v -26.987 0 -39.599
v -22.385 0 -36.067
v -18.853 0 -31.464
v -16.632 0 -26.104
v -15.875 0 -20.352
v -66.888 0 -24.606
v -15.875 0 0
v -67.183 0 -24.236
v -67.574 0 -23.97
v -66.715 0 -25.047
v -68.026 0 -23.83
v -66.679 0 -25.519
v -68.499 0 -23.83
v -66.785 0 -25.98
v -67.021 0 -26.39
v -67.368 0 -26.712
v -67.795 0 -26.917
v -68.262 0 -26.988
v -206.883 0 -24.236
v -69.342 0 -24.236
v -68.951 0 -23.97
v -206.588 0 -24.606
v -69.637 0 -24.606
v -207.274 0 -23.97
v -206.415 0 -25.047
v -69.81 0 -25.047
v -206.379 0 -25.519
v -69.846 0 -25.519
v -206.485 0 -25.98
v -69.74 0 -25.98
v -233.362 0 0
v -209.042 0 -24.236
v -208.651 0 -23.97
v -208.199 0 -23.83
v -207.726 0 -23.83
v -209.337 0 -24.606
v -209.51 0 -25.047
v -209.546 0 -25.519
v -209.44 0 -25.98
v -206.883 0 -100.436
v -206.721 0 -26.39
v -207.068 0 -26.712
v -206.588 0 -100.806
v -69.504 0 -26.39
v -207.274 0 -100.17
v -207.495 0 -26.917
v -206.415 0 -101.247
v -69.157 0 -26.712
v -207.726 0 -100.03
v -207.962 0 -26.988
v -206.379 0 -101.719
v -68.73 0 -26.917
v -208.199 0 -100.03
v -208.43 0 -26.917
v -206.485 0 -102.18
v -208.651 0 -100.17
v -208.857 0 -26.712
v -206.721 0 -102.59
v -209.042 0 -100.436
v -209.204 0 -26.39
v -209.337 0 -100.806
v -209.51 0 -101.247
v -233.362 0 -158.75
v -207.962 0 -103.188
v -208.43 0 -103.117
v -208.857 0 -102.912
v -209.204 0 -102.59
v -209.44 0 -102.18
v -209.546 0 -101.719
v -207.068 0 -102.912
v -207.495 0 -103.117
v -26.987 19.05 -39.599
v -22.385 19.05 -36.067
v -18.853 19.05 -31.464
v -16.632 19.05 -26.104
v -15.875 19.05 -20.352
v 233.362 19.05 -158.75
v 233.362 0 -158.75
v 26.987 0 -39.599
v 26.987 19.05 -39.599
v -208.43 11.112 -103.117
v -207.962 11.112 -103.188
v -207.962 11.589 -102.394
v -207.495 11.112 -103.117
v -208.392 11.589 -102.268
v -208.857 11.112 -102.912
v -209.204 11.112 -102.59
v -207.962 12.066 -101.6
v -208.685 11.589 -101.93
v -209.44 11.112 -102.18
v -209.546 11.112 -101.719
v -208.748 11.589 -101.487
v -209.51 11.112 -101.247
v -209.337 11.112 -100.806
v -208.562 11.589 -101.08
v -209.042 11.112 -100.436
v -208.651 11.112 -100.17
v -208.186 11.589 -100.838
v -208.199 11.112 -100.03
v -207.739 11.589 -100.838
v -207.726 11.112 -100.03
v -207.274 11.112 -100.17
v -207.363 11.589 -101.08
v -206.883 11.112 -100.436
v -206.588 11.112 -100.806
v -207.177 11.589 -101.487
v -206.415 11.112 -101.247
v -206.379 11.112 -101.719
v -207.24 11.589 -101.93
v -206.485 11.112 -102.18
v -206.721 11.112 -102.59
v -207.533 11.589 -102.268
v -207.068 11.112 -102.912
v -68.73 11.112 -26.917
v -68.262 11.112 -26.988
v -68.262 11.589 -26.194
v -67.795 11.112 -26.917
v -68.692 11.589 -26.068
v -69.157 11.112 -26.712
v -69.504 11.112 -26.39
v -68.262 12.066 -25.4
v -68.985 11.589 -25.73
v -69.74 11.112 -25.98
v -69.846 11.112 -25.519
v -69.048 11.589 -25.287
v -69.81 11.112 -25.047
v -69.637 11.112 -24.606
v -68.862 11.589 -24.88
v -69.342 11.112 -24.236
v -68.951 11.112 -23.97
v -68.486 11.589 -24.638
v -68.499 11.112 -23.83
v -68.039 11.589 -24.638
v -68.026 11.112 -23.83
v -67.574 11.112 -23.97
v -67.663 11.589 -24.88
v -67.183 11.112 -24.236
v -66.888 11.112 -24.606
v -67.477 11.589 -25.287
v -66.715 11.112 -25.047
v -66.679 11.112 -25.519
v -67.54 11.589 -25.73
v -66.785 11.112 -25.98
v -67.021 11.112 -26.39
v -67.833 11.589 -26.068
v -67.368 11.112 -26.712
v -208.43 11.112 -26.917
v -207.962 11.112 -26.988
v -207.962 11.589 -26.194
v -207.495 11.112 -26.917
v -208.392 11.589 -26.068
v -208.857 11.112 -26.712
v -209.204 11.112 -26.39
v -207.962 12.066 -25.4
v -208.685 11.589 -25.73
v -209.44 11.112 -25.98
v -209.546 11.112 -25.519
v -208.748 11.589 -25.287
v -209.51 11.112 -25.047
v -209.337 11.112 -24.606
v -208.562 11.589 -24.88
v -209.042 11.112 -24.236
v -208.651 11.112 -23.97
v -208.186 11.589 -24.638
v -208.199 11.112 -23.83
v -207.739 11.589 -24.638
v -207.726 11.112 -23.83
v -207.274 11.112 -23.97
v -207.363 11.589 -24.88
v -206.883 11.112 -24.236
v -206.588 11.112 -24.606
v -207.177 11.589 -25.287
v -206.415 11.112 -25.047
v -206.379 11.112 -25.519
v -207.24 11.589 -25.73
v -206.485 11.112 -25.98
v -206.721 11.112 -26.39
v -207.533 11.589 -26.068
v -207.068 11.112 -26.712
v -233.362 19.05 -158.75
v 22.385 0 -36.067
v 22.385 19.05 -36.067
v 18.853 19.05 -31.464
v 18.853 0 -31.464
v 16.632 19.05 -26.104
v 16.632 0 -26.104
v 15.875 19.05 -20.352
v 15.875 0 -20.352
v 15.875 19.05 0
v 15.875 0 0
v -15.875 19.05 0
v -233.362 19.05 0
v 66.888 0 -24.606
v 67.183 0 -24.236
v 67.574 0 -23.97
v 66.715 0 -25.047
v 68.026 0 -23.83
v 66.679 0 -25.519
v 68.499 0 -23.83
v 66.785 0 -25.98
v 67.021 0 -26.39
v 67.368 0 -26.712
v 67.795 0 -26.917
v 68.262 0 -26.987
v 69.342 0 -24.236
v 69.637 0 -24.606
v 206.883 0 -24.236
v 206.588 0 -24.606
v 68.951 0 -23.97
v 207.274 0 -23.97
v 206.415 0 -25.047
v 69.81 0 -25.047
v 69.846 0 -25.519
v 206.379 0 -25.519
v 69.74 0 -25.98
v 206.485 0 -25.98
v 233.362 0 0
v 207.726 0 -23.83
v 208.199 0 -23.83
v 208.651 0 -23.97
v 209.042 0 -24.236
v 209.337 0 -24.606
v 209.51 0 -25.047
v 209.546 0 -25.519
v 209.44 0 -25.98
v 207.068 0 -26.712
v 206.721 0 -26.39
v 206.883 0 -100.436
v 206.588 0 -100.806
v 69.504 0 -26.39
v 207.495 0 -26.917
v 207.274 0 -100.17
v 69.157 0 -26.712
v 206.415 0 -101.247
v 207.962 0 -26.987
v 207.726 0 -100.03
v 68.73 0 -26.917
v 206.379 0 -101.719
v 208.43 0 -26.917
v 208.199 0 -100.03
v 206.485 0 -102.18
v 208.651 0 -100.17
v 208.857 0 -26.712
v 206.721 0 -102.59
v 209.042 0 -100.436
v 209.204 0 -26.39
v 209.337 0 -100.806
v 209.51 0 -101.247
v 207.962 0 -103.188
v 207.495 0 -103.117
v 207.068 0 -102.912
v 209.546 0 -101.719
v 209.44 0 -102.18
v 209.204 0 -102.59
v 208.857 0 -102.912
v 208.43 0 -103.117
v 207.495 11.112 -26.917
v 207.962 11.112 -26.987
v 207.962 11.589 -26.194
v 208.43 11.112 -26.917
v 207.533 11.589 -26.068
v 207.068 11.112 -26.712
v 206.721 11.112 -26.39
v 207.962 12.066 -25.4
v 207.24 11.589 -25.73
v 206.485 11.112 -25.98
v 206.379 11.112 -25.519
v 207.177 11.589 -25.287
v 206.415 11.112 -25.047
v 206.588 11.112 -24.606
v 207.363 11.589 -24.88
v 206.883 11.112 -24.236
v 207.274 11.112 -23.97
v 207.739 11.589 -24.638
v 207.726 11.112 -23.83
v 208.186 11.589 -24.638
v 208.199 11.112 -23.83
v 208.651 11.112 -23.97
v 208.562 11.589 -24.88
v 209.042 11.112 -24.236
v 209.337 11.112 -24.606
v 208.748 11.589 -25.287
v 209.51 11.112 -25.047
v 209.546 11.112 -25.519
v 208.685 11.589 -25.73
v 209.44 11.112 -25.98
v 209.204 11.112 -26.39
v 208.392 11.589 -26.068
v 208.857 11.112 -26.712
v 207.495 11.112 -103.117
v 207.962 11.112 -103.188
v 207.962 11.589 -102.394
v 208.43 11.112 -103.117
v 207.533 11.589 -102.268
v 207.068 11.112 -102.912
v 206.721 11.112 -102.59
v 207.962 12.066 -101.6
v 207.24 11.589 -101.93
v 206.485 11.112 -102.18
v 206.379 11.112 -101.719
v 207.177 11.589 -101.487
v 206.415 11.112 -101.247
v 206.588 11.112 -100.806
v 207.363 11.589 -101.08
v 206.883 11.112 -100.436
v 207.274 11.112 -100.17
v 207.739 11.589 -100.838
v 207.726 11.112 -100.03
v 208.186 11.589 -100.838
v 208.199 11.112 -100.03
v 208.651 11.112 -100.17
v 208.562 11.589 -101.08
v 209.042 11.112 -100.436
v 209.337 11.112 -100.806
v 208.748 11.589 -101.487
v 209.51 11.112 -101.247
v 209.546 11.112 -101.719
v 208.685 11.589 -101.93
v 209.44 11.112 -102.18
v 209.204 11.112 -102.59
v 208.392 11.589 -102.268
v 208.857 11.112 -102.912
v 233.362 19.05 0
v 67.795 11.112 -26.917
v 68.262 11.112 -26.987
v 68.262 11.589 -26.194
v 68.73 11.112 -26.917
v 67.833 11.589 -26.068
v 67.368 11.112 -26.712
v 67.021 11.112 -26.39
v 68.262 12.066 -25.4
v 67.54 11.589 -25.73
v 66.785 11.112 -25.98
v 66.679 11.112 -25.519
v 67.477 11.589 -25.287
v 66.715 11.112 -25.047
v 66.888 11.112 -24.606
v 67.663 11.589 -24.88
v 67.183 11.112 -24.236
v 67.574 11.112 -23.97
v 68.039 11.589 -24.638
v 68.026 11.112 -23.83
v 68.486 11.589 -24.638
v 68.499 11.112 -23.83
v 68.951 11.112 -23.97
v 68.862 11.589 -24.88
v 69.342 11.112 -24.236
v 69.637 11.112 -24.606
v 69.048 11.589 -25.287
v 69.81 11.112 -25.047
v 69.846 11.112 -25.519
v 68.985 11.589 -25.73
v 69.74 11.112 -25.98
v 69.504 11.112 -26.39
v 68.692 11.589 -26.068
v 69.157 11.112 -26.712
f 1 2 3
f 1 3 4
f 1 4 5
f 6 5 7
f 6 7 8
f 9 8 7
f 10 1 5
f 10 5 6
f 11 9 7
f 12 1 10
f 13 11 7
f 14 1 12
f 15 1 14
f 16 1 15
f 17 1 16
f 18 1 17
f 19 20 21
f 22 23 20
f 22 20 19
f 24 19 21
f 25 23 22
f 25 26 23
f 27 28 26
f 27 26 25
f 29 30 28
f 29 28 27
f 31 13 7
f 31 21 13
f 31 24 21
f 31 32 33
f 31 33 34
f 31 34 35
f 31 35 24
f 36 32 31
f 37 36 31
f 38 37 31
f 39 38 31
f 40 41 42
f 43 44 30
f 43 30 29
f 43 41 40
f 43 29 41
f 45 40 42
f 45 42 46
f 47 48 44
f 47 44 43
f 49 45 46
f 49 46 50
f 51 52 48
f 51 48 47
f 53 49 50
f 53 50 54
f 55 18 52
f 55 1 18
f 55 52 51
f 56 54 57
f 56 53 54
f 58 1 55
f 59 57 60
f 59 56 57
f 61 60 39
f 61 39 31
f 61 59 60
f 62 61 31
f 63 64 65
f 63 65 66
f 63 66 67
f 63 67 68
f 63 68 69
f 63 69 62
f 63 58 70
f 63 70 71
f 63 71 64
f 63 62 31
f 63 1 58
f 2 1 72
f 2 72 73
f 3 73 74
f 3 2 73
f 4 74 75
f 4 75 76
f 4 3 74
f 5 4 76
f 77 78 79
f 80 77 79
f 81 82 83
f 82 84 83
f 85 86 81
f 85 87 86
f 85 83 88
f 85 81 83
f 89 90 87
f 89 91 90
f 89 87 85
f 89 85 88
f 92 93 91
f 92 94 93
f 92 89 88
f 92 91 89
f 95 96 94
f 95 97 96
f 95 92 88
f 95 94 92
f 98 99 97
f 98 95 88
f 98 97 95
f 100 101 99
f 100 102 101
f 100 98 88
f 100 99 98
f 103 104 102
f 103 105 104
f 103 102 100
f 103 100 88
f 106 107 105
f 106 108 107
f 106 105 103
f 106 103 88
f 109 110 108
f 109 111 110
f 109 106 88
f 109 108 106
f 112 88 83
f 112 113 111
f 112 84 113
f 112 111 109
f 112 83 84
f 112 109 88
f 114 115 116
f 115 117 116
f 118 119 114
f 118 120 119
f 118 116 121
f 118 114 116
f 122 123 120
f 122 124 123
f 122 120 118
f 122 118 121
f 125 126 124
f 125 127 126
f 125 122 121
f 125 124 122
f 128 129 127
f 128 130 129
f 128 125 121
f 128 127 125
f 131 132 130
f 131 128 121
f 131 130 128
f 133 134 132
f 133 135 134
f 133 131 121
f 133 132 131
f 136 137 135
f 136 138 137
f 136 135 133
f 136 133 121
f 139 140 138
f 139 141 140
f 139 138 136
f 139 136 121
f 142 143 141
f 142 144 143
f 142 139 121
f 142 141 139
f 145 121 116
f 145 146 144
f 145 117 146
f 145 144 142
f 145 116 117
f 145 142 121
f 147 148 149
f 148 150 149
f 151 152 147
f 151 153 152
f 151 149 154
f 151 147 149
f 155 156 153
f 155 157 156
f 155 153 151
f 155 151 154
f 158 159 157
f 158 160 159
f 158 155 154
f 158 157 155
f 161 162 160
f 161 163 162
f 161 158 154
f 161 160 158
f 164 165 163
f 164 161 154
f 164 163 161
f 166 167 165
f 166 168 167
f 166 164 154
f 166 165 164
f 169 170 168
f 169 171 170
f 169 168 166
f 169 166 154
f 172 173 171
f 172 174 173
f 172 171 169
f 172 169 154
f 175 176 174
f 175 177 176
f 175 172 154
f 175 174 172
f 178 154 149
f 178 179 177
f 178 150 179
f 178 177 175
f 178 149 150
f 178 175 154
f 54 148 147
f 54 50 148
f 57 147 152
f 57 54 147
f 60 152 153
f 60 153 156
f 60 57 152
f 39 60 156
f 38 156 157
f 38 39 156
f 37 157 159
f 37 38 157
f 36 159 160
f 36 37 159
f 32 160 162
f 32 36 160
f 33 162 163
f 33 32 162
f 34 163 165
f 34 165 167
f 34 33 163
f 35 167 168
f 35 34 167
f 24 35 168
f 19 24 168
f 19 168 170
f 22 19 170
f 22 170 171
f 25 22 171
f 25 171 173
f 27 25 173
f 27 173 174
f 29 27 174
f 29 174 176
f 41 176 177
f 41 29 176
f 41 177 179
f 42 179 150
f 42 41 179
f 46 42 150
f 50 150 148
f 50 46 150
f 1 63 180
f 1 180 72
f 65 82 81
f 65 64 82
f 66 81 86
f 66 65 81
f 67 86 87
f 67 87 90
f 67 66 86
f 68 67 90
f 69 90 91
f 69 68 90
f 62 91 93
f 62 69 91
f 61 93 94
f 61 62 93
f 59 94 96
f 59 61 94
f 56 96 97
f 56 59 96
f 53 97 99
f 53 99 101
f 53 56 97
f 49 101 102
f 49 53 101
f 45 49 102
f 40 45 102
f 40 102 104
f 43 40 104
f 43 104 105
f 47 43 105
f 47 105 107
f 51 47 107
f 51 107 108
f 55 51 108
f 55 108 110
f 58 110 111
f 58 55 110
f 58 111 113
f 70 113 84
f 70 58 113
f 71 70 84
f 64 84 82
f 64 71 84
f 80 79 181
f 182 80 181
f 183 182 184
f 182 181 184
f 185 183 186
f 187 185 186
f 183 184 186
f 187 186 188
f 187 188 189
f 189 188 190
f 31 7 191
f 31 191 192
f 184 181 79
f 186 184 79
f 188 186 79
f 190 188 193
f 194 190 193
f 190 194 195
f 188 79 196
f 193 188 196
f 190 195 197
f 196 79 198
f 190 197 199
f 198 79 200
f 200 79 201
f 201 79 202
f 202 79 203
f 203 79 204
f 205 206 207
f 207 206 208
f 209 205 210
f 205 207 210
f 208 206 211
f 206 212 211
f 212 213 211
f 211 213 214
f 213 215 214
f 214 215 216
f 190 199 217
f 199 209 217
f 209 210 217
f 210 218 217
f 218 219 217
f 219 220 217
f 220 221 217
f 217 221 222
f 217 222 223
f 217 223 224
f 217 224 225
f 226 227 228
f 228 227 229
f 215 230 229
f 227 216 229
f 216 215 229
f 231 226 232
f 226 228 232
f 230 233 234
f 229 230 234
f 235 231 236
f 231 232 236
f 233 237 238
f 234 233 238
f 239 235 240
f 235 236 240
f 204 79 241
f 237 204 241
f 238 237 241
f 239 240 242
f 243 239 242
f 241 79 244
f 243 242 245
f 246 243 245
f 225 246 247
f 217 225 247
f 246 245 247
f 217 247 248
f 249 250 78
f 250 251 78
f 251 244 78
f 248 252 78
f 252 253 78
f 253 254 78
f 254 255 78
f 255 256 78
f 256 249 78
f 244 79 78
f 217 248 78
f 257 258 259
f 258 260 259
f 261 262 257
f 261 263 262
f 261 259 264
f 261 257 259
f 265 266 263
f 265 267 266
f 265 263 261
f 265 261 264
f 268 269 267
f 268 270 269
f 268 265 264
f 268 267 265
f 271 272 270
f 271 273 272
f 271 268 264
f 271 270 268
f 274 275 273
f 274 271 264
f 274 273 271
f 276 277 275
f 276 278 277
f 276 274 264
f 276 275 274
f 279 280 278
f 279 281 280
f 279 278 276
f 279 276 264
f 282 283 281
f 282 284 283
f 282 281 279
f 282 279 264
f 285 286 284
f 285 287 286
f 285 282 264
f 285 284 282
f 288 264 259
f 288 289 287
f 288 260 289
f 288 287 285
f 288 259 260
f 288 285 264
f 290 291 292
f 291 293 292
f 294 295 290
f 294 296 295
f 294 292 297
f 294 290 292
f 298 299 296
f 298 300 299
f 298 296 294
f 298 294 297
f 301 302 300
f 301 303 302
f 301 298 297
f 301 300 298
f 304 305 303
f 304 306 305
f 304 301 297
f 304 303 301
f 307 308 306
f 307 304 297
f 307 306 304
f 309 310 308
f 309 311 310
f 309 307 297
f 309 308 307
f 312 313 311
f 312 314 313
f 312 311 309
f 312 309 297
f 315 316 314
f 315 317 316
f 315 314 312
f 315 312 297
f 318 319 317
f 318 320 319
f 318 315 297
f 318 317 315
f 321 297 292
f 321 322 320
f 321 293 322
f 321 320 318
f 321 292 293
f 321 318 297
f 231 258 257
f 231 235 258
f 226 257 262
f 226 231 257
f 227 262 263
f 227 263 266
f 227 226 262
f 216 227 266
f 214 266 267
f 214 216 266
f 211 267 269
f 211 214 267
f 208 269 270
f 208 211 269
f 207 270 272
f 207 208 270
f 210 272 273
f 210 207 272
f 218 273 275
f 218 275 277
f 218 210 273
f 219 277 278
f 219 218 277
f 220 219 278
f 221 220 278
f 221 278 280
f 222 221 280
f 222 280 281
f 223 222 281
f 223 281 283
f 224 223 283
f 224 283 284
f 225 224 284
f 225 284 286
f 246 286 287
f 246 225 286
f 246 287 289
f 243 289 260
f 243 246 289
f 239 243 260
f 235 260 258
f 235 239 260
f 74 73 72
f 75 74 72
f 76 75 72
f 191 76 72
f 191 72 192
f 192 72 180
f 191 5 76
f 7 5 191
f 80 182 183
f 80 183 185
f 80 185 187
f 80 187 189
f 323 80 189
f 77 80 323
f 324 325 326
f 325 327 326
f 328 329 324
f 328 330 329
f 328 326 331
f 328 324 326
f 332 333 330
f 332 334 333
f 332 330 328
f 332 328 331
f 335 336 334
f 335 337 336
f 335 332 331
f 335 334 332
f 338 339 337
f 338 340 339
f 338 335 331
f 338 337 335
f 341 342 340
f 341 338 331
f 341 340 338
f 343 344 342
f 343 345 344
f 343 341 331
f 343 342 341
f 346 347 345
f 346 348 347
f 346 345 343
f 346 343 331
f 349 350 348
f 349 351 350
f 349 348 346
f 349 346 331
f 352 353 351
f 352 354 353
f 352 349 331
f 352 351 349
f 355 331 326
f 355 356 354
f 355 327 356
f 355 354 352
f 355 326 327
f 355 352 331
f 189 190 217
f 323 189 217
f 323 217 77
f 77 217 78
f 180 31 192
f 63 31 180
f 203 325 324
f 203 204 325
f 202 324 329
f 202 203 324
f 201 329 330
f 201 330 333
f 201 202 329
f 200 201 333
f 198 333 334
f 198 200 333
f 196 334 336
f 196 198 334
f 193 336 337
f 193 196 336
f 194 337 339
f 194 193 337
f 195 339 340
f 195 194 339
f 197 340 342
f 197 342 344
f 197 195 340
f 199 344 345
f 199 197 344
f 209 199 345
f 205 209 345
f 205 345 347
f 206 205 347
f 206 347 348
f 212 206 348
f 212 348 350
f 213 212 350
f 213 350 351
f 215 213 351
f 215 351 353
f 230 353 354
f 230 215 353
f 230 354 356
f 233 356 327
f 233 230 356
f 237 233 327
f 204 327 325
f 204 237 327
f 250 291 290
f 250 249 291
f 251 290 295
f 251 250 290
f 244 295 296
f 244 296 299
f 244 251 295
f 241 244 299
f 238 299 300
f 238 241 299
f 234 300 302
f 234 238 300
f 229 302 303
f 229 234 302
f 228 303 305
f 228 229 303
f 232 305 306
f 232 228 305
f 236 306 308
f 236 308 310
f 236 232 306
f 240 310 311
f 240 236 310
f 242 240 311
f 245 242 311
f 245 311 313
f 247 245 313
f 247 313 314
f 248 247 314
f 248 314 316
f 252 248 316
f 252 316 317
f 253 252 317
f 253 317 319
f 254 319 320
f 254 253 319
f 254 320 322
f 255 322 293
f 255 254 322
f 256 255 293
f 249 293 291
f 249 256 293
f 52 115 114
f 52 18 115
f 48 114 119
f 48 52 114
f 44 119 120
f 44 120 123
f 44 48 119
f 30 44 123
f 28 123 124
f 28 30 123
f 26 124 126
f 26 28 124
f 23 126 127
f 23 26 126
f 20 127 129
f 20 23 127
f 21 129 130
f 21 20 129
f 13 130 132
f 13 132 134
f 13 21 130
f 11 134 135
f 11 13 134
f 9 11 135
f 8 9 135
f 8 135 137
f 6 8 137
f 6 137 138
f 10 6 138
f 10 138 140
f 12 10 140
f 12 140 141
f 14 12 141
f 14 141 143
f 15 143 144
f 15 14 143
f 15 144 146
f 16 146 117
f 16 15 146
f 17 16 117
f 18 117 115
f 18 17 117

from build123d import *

# Parameters (mm, degrees)
BOSS_EXTRUDE1_DEPTH                   = 19.05
BOSS_EXTRUDE1_2_DEPTH                 = 19.05
F_1_8_0_125_DIAMETER_HOLE1_AT_2_COUNT = 2
F_1_8_0_125_DIAMETER_HOLE1_AT_2_PITCH = 76.2
F_1_8_0_125_DIAMETER_HOLE1_AT_3_COUNT = 2
F_1_8_0_125_DIAMETER_HOLE1_AT_3_PITCH = 159.130543894
F_1_8_0_125_DIAMETER_HOLE1_AT_4_COUNT = 2
F_1_8_0_125_DIAMETER_HOLE1_AT_4_PITCH = 286.542650621
F_1_8_0_125_DIAMETER_HOLE1_AT_5_COUNT = 2
F_1_8_0_125_DIAMETER_HOLE1_AT_5_PITCH = 422.847544187
F_1_8_0_125_DIAMETER_HOLE1_AT_6_COUNT = 2
F_1_8_0_125_DIAMETER_HOLE1_AT_6_PITCH = 415.925


with BuildPart() as part:
    # Sketch1 → Boss-Extrude1 (new body)
    with BuildSketch(Plane(origin=(0, 0, 0), x_dir=(1, 0, 0), z_dir=(0, 1, 0))):
        with BuildLine():
            ThreePointArc((-26.9875, 39.599338196), (-18.852585401, 31.464423597), (-15.875, 20.351923597))
            Line((-15.875, 20.351923597), (-15.875, 0))
            Line((-15.875, 0), (-233.3625, 0))
            Line((-233.3625, 0), (-233.3625, 158.75))
            Line((-233.3625, 158.75), (-26.9875, 39.599338196))
        make_face()
    extrude(amount=BOSS_EXTRUDE1_DEPTH)


with BuildPart() as body_2:
    # Sketch1 → Boss-Extrude1 2 (new body)
    with BuildSketch(Plane(origin=(0, 0, 0), x_dir=(1, 0, 0), z_dir=(0, 1, 0))):
        with BuildLine():
            Line((233.3625, 158.75), (26.9875, 39.599338196))
            ThreePointArc((26.9875, 39.599338196), (18.852585401, 31.464423597), (15.875, 20.351923597))
            Line((15.875, 20.351923597), (15.875, 0))
            Line((15.875, 0), (233.3625, 0))
            Line((233.3625, 0), (233.3625, 158.75))
        make_face()
    extrude(amount=BOSS_EXTRUDE1_2_DEPTH)

    # Sketch3 → 1/8 (0.125) Diameter Hole1 (revolve, cut)
    with BuildSketch(Plane(origin=(207.9625, 0, -101.6), x_dir=(0, 0, -1), z_dir=(1, 0, 0))):
        Polygon((0, 0), (0, 12.066366233), (1.5875, 11.1125), (1.5875, 0), align=None)
    f_1_8_0_125_diameter_hole1 = revolve(axis=Axis((207.9625, -6.35, -101.6), (0, 1, 0)), mode=Mode.SUBTRACT)

    # 1/8 (0.125) Diameter Hole1 at 2: 1/8 (0.125) Diameter Hole1 ×2
    with Locations(*[(0, 0, i * F_1_8_0_125_DIAMETER_HOLE1_AT_2_PITCH) for i in range(1, F_1_8_0_125_DIAMETER_HOLE1_AT_2_COUNT)]):
        add(f_1_8_0_125_diameter_hole1, mode=Mode.SUBTRACT)

    # 1/8 (0.125) Diameter Hole1 at 3: 1/8 (0.125) Diameter Hole1 ×2
    with Locations(*[Vector(-0.8778955729143845, 0, 0.4788521306805733) * (i * F_1_8_0_125_DIAMETER_HOLE1_AT_3_PITCH) for i in range(1, F_1_8_0_125_DIAMETER_HOLE1_AT_3_COUNT)]):
        add(f_1_8_0_125_diameter_hole1, mode=Mode.SUBTRACT)


with BuildPart() as part_1:
    add(part.part)

    # 1/8 (0.125) Diameter Hole1 at 4: 1/8 (0.125) Diameter Hole1 ×2
    with Locations(*[Vector(-0.9639926182060737, 0, 0.2659289981258134) * (i * F_1_8_0_125_DIAMETER_HOLE1_AT_4_PITCH) for i in range(1, F_1_8_0_125_DIAMETER_HOLE1_AT_4_COUNT)]):
        add(f_1_8_0_125_diameter_hole1, mode=Mode.SUBTRACT)

    # 1/8 (0.125) Diameter Hole1 at 5: 1/8 (0.125) Diameter Hole1 ×2
    with Locations(*[Vector(-0.9836287468564193, 0, 0.1802067933172066) * (i * F_1_8_0_125_DIAMETER_HOLE1_AT_5_PITCH) for i in range(1, F_1_8_0_125_DIAMETER_HOLE1_AT_5_COUNT)]):
        add(f_1_8_0_125_diameter_hole1, mode=Mode.SUBTRACT)

    # 1/8 (0.125) Diameter Hole1 at 6: 1/8 (0.125) Diameter Hole1 ×2
    with Locations(*[(-i * F_1_8_0_125_DIAMETER_HOLE1_AT_6_PITCH, 0, 0) for i in range(1, F_1_8_0_125_DIAMETER_HOLE1_AT_6_COUNT)]):
        add(f_1_8_0_125_diameter_hole1, mode=Mode.SUBTRACT)


solid = Compound([body_2.part, part_1.part])
